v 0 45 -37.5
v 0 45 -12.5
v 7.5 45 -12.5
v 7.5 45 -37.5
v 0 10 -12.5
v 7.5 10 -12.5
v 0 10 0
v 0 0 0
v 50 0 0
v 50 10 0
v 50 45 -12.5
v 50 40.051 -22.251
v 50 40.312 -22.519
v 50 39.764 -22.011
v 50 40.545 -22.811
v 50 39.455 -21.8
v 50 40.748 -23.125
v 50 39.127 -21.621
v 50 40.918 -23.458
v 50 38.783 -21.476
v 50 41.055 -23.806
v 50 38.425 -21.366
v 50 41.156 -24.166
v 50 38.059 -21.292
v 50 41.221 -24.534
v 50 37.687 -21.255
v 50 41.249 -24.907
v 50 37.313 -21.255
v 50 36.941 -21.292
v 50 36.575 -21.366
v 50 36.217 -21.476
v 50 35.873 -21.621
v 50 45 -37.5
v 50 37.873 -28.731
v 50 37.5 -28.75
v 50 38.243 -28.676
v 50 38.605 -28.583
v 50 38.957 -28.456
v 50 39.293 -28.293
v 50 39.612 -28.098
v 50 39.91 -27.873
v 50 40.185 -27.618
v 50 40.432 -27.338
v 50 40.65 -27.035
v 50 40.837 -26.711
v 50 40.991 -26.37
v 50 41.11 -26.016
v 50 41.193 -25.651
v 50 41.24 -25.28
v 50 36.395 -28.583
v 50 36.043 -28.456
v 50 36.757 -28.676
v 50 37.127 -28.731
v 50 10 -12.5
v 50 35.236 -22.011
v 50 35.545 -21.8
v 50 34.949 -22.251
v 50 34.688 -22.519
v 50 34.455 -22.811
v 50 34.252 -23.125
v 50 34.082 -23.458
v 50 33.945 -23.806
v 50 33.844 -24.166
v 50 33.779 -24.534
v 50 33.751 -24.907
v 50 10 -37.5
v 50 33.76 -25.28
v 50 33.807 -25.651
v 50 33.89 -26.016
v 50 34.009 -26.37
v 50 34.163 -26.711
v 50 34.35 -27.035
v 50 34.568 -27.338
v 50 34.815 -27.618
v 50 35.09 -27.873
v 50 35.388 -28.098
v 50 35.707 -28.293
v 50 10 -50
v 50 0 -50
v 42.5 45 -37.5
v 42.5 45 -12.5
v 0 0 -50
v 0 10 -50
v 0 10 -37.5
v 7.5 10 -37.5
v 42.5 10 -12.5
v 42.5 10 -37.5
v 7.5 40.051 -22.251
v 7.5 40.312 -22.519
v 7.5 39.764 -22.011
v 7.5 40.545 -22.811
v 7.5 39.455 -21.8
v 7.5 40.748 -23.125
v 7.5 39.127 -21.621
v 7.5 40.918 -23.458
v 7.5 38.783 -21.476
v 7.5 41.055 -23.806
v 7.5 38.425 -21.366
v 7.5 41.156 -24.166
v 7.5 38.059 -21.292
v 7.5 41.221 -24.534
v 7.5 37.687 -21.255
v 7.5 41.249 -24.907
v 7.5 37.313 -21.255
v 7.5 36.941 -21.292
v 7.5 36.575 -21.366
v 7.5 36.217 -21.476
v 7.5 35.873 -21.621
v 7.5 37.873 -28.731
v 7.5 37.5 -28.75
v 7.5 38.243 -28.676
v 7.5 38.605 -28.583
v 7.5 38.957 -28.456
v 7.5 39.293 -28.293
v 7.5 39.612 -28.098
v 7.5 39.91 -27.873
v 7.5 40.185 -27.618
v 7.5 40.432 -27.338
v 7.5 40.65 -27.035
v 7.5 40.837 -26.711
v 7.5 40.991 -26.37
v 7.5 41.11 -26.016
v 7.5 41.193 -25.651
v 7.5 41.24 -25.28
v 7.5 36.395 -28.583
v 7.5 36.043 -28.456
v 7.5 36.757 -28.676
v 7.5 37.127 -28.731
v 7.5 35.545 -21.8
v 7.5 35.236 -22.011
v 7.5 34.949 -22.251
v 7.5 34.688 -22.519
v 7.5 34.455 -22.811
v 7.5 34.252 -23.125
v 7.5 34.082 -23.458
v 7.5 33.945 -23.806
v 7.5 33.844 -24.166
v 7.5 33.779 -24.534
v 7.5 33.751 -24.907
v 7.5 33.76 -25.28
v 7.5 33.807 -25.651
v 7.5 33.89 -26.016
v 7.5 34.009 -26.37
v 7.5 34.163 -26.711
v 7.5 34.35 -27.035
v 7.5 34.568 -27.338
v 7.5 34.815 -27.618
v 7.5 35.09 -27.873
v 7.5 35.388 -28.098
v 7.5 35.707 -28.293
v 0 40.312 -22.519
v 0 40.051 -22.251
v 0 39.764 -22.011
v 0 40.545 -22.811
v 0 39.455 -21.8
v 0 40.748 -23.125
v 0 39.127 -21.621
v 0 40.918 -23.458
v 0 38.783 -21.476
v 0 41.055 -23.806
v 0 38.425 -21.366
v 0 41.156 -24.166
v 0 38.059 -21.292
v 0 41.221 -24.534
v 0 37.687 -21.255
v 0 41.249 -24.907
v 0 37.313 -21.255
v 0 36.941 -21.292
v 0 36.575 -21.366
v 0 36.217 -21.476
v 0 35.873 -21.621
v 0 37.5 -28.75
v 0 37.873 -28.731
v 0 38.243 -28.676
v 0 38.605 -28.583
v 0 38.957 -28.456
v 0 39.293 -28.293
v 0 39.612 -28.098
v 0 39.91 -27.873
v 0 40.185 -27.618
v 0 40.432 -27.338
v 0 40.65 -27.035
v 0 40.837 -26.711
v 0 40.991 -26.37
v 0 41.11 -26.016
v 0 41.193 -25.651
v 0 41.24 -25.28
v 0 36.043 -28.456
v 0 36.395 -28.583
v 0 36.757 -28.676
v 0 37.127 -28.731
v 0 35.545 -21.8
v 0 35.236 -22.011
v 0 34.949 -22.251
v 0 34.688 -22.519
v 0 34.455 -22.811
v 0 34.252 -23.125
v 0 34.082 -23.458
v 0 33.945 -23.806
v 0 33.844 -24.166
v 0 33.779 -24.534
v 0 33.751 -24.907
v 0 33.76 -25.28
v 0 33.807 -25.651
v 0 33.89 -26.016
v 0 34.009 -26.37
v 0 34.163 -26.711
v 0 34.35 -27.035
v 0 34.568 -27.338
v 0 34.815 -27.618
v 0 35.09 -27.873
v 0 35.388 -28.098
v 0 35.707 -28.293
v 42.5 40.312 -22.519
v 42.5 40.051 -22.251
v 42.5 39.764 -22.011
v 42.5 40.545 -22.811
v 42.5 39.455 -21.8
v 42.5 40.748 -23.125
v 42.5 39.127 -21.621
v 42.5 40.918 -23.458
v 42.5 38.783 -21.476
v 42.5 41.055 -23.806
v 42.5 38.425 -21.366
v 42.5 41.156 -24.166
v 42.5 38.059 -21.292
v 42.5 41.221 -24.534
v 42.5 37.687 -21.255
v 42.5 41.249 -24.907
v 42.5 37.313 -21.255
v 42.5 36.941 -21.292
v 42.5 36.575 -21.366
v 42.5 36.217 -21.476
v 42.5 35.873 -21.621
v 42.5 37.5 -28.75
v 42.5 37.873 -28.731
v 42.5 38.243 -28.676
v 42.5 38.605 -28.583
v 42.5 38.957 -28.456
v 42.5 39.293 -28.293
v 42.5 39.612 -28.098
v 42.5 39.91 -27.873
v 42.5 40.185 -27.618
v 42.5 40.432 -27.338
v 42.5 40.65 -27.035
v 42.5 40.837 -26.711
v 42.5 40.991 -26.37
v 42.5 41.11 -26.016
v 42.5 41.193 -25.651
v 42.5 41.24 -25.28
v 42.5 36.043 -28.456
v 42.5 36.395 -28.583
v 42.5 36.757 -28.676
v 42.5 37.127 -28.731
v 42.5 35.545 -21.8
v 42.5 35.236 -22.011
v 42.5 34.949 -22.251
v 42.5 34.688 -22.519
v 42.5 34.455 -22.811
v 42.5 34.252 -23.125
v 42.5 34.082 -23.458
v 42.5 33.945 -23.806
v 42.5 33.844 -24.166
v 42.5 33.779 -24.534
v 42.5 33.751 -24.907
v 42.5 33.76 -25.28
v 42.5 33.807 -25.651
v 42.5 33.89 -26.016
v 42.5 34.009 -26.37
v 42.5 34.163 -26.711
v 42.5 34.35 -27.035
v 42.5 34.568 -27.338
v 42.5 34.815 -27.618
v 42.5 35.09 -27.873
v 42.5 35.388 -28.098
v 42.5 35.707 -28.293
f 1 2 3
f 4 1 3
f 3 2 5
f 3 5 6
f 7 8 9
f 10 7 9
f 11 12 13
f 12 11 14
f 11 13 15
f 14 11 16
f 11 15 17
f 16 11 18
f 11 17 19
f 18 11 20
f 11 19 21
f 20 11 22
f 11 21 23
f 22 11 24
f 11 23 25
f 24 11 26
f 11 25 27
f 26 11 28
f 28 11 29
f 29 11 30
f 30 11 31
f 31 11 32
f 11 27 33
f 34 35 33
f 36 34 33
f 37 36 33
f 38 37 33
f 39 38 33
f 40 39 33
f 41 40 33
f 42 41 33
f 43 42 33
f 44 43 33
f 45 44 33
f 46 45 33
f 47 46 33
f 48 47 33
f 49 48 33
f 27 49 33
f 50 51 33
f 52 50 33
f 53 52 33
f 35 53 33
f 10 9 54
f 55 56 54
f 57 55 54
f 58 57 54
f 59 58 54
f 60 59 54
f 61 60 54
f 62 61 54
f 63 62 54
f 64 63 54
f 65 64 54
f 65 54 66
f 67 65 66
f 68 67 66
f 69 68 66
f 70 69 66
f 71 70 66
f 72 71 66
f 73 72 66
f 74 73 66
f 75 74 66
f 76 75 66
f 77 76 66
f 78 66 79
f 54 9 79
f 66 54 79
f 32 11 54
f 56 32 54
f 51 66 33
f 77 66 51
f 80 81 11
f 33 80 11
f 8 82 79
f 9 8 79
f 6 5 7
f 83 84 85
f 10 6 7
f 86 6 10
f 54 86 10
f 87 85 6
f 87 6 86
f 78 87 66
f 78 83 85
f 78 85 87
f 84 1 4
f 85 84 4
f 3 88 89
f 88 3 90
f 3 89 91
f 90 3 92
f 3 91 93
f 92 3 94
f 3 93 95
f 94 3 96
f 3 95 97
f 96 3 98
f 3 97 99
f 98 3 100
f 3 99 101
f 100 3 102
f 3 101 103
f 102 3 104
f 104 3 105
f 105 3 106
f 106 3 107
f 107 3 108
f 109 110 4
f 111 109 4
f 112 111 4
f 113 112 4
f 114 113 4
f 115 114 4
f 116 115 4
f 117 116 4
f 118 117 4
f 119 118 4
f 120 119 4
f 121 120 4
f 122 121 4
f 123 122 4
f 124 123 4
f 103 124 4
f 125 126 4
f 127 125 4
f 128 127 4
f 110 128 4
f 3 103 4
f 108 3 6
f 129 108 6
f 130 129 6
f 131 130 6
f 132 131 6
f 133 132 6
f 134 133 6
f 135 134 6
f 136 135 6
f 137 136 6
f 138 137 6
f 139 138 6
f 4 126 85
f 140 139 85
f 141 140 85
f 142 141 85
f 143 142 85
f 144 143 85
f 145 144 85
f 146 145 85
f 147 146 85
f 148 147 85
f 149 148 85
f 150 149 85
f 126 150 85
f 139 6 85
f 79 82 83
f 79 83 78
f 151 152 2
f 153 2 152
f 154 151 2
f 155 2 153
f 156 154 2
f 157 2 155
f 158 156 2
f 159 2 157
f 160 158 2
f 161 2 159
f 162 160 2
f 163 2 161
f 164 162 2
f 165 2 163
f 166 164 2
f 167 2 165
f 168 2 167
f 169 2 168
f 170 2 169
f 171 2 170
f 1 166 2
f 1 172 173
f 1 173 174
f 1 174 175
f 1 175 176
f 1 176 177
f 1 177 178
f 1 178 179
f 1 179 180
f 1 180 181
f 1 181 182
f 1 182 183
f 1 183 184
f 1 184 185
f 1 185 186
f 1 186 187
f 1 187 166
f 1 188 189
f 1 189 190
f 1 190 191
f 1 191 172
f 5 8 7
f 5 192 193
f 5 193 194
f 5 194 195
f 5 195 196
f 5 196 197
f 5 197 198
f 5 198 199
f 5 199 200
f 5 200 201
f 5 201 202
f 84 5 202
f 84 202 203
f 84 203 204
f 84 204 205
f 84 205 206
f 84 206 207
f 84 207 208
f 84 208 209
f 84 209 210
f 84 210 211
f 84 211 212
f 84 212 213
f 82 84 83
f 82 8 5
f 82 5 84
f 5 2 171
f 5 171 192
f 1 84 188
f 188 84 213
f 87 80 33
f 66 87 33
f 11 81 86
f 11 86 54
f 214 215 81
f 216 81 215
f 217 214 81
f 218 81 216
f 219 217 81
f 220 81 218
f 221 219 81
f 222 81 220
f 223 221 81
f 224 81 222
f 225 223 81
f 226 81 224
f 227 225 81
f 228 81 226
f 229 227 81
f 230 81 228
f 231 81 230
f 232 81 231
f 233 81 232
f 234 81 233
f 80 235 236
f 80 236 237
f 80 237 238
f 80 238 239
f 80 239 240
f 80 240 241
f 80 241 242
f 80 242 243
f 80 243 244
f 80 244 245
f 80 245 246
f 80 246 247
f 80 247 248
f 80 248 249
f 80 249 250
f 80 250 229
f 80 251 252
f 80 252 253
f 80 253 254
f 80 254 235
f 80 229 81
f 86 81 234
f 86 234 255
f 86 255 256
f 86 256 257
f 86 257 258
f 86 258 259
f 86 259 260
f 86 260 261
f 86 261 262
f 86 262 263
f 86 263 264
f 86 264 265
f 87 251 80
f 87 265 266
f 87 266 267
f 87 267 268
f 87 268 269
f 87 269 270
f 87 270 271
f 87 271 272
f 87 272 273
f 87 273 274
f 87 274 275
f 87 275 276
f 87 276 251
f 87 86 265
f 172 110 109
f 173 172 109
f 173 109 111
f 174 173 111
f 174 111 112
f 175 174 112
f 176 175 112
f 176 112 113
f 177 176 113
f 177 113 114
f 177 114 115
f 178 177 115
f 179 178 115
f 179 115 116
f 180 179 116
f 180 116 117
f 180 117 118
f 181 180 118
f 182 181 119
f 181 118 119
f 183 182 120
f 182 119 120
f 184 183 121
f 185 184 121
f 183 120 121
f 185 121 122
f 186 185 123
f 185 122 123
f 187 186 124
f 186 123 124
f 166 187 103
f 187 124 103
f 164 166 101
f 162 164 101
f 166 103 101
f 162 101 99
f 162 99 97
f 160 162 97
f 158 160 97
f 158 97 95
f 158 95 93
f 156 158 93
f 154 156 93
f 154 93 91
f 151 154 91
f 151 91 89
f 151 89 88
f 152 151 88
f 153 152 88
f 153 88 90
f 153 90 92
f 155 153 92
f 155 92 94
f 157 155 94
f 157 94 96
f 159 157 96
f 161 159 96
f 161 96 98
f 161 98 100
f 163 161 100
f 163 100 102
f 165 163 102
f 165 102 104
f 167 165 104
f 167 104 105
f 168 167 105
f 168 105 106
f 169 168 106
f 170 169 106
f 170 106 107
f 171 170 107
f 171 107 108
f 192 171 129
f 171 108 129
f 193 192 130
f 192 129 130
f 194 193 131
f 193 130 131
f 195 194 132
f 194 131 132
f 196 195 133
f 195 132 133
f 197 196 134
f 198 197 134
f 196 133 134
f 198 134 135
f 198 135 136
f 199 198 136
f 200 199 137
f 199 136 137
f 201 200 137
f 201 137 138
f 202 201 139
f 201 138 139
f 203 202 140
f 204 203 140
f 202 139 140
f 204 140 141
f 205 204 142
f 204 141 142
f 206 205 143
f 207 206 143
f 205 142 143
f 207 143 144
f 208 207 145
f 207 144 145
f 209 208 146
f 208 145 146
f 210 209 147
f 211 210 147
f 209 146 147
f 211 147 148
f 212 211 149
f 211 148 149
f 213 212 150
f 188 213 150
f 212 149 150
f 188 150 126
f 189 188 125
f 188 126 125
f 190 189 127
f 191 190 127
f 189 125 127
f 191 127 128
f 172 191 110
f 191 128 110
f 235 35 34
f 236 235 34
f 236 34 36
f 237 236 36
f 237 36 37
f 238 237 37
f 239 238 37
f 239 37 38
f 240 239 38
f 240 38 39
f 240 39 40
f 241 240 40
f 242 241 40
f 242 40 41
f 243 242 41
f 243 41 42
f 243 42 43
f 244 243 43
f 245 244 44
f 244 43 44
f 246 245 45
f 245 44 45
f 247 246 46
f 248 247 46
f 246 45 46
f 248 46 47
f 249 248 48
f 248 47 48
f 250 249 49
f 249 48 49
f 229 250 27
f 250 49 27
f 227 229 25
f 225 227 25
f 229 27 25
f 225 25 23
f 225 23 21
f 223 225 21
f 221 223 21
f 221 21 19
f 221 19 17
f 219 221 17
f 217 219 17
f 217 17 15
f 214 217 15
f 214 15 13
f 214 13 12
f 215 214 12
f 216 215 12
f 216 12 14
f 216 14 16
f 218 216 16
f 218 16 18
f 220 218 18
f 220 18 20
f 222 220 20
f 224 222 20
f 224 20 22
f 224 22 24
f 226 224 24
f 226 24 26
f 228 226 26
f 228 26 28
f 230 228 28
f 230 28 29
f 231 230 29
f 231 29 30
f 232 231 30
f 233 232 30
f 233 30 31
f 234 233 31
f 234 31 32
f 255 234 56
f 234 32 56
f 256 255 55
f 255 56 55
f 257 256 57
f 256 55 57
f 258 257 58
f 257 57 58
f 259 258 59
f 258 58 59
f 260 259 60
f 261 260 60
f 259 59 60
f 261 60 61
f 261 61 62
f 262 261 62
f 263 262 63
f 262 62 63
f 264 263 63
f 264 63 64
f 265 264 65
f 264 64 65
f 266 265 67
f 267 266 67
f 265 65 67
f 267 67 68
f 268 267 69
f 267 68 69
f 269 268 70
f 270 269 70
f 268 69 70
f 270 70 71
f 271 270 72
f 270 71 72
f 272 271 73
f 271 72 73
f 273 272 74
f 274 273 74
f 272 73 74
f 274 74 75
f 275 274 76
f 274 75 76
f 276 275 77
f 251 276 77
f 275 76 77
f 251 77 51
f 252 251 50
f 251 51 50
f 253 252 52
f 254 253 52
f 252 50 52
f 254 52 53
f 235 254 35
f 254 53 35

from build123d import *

# Parameters (mm, degrees)
SKETCH2_W           = 50
SKETCH2_H           = 50
BOSS_EXTRUDE1_DEPTH = 10
SKETCH3_W           = 7.5
SKETCH3_H           = 25
BOSS_EXTRUDE2_DEPTH = 35
SKETCH4_R           = 3.75
CUT_EXTRUDE1_DEPTH  = 50


with BuildPart() as part:
    # Sketch2 → Boss-Extrude1 (new body)
    with BuildSketch(Plane(origin=(0, 0, 0), x_dir=(1, 0, 0), z_dir=(0, 1, 0))):
        with Locations((25, 25)):
            Rectangle(SKETCH2_W, SKETCH2_H)
    extrude(amount=BOSS_EXTRUDE1_DEPTH)

    # Sketch3 → Boss-Extrude2 (add)
    with BuildSketch(Plane(origin=(0, 10, 0), x_dir=(1, 0, 0), z_dir=(0, 1, 0))):
        with Locations((3.75, 25)):
            Rectangle(SKETCH3_W, SKETCH3_H)
        with Locations((46.25, 25)):
            Rectangle(SKETCH3_W, SKETCH3_H)
    extrude(amount=BOSS_EXTRUDE2_DEPTH)

    # Sketch4 → Cut-Extrude1 (cut)
    with BuildSketch(Plane(origin=(50, 0, 0), x_dir=(0, 0, -1), z_dir=(1, 0, 0))):
        with Locations((25, 37.5)):
            Circle(SKETCH4_R)
    extrude(amount=-CUT_EXTRUDE1_DEPTH, mode=Mode.SUBTRACT)


solid = part.part
